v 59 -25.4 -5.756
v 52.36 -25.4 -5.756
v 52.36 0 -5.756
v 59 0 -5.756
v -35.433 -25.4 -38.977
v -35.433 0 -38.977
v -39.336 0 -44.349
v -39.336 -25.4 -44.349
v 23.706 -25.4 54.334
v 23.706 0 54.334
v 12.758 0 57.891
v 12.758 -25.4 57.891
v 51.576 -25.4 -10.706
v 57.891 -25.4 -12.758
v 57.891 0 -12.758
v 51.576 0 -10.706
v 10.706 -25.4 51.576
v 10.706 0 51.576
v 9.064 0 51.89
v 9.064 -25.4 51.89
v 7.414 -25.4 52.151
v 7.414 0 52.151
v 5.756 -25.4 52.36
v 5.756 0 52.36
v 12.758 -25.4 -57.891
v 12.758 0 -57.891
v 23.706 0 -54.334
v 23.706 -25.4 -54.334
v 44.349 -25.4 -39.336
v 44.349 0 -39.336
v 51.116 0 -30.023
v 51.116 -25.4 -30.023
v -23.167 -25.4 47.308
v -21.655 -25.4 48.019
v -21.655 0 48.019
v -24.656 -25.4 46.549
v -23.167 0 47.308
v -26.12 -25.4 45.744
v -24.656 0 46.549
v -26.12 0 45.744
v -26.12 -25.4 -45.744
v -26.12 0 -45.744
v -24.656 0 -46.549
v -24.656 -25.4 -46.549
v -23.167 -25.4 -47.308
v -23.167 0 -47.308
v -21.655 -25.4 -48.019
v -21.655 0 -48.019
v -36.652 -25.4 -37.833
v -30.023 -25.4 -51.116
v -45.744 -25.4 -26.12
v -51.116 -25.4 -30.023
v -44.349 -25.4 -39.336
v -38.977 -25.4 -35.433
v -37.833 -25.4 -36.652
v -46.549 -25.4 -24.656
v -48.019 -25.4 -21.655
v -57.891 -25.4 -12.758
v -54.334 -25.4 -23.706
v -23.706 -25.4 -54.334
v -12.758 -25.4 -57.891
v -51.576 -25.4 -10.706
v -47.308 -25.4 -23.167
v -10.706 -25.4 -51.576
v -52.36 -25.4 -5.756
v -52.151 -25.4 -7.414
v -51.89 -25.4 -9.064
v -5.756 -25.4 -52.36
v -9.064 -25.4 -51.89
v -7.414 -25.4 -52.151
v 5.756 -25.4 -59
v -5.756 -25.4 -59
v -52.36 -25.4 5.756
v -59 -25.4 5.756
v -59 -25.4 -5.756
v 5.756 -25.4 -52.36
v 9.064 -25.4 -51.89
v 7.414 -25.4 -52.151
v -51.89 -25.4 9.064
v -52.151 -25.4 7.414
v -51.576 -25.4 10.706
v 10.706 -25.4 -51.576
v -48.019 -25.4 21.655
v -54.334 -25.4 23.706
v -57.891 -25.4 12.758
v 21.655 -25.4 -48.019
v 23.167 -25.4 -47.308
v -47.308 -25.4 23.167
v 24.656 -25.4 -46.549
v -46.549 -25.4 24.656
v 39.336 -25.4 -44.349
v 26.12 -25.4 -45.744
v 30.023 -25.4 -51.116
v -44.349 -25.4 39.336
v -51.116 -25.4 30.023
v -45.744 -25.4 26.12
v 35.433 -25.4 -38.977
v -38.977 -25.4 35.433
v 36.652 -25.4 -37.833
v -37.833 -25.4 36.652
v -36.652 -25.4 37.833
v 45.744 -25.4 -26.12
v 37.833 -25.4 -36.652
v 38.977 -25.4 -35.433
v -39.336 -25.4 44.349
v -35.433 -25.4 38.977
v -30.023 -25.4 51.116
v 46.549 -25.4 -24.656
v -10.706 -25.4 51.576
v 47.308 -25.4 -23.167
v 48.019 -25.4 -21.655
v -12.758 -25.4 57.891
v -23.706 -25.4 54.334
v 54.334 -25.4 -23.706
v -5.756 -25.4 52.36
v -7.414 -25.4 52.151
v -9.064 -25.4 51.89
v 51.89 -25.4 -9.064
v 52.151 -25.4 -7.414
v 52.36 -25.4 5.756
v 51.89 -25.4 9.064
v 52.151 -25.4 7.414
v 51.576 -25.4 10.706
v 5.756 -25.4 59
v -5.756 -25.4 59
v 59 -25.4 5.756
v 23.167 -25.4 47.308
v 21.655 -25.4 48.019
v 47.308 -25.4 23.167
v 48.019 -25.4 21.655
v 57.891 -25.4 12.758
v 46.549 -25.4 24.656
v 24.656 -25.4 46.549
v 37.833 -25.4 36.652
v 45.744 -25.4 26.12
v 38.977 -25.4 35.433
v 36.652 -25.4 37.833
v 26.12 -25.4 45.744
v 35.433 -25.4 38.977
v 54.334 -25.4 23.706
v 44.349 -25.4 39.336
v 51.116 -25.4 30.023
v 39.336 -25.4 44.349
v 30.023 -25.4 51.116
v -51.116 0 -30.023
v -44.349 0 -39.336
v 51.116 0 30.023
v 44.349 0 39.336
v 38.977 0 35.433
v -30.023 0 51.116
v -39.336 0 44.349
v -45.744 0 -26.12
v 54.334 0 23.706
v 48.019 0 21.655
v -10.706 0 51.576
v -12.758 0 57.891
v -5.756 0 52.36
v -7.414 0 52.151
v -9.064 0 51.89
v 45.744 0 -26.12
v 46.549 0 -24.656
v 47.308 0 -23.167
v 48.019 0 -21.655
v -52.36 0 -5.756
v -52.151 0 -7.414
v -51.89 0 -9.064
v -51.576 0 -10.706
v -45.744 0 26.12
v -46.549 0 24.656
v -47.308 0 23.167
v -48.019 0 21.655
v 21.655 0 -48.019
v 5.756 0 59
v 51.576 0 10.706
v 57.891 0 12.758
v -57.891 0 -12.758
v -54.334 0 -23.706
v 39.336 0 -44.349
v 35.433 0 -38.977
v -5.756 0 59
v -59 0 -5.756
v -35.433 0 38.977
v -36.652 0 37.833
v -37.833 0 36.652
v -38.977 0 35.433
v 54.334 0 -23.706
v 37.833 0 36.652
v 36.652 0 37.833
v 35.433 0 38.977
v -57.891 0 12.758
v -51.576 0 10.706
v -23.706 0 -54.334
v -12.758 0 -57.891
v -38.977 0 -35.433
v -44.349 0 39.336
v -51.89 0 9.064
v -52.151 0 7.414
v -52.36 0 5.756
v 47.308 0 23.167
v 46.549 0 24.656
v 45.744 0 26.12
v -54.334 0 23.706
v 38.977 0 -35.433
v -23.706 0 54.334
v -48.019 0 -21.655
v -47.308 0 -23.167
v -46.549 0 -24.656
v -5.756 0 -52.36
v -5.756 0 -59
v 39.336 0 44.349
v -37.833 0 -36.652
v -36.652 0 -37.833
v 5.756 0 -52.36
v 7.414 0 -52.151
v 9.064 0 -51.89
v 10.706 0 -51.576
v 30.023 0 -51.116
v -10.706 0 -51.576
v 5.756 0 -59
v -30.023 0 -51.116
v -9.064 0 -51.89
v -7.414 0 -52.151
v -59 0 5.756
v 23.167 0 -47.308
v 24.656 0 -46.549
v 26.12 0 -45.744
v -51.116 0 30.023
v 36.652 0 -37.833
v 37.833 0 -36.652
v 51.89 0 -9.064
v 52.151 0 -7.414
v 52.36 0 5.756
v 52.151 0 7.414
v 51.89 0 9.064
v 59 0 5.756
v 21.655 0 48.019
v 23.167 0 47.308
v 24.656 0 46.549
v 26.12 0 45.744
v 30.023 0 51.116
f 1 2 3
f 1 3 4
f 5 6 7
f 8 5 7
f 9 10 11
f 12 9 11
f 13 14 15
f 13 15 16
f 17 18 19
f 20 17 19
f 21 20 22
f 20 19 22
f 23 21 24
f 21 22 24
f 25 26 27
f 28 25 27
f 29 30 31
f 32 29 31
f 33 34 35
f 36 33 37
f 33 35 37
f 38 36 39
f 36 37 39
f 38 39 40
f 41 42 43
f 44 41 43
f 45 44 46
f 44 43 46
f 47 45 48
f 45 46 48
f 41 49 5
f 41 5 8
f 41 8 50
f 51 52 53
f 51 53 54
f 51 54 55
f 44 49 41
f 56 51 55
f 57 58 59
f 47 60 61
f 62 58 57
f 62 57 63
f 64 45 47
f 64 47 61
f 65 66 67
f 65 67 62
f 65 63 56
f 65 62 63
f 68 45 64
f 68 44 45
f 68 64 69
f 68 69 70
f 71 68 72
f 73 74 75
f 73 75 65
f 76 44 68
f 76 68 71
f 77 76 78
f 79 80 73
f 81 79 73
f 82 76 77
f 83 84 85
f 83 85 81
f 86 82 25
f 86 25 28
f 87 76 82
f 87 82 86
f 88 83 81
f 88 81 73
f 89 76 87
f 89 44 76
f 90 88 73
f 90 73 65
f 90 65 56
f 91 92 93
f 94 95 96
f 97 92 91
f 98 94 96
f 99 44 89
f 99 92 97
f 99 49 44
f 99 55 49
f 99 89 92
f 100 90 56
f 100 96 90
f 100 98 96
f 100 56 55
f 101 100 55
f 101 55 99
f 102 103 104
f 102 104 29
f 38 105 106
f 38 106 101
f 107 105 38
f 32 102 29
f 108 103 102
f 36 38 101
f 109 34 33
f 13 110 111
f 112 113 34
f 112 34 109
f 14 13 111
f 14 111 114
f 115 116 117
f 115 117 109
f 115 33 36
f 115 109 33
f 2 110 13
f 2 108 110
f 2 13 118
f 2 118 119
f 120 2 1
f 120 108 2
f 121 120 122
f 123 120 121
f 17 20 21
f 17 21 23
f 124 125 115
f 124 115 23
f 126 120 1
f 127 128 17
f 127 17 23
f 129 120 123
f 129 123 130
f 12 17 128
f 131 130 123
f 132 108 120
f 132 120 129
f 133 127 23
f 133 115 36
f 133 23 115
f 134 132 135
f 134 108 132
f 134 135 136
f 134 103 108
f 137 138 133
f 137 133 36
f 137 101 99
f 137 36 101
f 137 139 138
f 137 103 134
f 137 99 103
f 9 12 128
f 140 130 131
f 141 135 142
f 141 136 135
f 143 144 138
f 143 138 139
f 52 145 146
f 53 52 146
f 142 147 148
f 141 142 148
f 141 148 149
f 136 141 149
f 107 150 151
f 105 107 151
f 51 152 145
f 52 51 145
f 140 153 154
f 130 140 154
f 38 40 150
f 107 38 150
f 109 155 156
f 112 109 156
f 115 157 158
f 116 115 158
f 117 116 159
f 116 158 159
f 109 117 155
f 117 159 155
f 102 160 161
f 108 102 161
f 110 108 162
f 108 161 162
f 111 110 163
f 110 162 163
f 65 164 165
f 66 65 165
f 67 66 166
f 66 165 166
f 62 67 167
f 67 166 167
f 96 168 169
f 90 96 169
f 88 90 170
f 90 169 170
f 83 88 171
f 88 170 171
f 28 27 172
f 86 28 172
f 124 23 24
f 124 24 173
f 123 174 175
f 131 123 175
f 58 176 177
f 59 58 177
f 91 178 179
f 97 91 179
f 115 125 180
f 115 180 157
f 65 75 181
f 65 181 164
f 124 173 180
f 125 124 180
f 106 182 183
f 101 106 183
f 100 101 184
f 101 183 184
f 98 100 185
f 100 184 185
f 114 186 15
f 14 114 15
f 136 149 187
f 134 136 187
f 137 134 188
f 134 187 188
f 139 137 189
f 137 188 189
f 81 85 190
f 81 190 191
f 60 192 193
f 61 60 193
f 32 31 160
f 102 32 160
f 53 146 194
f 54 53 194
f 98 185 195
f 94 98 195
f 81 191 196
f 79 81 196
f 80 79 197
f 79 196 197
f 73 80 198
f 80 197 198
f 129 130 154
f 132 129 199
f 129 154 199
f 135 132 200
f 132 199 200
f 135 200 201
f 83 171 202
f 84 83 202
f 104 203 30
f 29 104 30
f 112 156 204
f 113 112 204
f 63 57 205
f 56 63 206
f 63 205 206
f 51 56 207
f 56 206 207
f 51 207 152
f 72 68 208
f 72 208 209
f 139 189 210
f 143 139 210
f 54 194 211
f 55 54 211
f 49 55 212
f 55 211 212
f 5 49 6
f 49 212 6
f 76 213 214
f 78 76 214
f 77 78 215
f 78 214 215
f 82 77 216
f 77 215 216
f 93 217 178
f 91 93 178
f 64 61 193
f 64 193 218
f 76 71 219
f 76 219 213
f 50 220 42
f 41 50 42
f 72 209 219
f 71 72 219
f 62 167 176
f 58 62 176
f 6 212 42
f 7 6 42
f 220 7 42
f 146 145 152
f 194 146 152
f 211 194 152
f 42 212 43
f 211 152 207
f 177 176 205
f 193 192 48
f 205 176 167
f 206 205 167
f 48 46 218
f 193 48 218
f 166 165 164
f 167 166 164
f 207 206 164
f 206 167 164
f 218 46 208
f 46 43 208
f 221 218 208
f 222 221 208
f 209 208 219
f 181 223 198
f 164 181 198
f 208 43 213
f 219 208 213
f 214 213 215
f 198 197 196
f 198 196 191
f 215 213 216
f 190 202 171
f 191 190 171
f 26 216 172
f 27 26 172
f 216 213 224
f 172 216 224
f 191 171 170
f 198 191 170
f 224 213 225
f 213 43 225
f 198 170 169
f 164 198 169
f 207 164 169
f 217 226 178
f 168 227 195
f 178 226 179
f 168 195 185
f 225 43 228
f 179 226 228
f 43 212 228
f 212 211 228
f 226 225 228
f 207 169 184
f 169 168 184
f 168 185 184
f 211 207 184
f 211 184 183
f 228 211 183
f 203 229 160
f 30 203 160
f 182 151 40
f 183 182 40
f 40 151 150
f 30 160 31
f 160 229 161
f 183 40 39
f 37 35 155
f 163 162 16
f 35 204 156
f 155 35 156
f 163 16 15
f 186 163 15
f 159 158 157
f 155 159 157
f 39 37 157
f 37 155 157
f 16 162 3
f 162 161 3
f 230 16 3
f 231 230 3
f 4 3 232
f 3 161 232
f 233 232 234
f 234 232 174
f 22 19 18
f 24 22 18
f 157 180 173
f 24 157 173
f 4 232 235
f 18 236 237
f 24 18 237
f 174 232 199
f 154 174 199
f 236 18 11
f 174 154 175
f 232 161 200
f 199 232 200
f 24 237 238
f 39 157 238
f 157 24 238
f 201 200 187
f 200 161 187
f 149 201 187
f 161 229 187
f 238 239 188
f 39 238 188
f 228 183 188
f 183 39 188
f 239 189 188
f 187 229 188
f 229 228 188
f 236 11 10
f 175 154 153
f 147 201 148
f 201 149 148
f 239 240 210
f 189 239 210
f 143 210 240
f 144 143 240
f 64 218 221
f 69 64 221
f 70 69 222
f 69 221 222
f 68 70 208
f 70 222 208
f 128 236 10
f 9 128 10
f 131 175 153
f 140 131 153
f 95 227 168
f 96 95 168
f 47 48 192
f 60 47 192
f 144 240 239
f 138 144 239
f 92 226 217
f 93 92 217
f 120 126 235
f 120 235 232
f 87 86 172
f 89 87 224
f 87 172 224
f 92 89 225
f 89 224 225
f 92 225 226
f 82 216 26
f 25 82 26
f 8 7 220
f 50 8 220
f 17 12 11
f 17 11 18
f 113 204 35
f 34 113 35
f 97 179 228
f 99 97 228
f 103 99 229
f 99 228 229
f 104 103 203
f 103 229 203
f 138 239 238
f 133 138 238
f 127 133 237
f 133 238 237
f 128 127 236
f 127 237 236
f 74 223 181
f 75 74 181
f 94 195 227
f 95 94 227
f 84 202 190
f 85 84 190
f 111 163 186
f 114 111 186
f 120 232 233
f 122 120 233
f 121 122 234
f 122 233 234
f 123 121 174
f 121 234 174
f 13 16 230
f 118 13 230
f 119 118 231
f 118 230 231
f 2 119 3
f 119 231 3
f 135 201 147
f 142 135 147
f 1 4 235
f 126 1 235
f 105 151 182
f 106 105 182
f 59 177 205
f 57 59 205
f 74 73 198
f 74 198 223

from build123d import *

# Parameters (mm, degrees)
F1_DEPTH = 25.4


with BuildPart() as f1:
    # F0 (on Front) → F1 (new body)
    with BuildSketch(Plane.XZ):
        with BuildLine():
            Line((5.7561155409, 52.3600886255), (5.7561155409, 59.0001791716))
            Line((5.7561155409, 59.0001791716), (-5.7561155409, 59.0001791716))
            Line((-5.7561155409, 59.0001791716), (-5.7561155409, 52.3600886255))
            ThreePointArc((-5.7561155409, 52.3600886255), (0, 52.6755327167), (5.7561155409, 52.3600886255))
        make_face()
        with BuildLine():
            ThreePointArc((10.7057660186, 51.5761410048), (8.2402687813, 52.027009499), (5.7561155409, 52.3600886255))
            Line((5.7561155409, 52.3600886255), (5.7561155409, 46.3508862619))
            Line((5.7561155409, 46.3508862619), (-5.7561155409, 46.3508862619))
            Line((-5.7561155409, 46.3508862619), (-5.7561155409, 52.3600886255))
            ThreePointArc((-5.7561155409, 52.3600886255), (-8.2402687813, 52.027009499), (-10.7057660186, 51.5761410048))
            Line((-10.7057660186, 51.5761410048), (-8.8488203656, 45.8610499392))
            Line((-8.8488203656, 45.8610499392), (-19.797602753, 42.3035748917))
            Line((-19.797602753, 42.3035748917), (-21.6545484059, 48.0186659574))
            ThreePointArc((-21.6545484059, 48.0186659574), (-23.9141914221, 46.9342433157), (-26.1196926087, 45.7435613504))
            ThreePointArc((-26.1196926087, 45.7435613504), (-30.9619012875, 42.6154011556), (-35.433283197, 38.9768416996))
            ThreePointArc((-35.433283197, 38.9768416996), (-37.2472263866, 37.2472263866), (-38.9768416996, 35.433283197))
            ThreePointArc((-38.9768416996, 35.433283197), (-42.6154011556, 30.9619012875), (-45.7435613504, 26.1196926087))
            ThreePointArc((-45.7435613504, 26.1196926087), (-46.9342433157, 23.9141914221), (-48.0186659574, 21.6545484059))
            ThreePointArc((-48.0186659574, 21.6545484059), (-50.0974086396, 16.2776347972), (-51.5761410048, 10.7057660186))
            ThreePointArc((-51.5761410048, 10.7057660186), (-52.027009499, 8.2402687813), (-52.3600886255, 5.7561155409))
            ThreePointArc((-52.3600886255, 5.7561155409), (-52.6755327167, 0), (-52.3600886255, -5.7561155409))
            ThreePointArc((-52.3600886255, -5.7561155409), (-52.027009499, -8.2402687813), (-51.5761410048, -10.7057660186))
            ThreePointArc((-51.5761410048, -10.7057660186), (-50.0974086396, -16.2776347972), (-48.0186659574, -21.6545484059))
            ThreePointArc((-48.0186659574, -21.6545484059), (-46.9342433157, -23.9141914221), (-45.7435613504, -26.1196926087))
            Line((-45.7435613504, -26.1196926087), (-40.8820145156, -22.5875720813))
            Line((-40.8820145156, -22.5875720813), (-34.1152948648, -31.9011626696))
            Line((-34.1152948648, -31.9011626696), (-38.9768416996, -35.433283197))
            ThreePointArc((-38.9768416996, -35.433283197), (-37.2472263866, -37.2472263866), (-35.433283197, -38.9768416996))
            Line((-35.433283197, -38.9768416996), (-31.9011626696, -34.1152948648))
            Line((-31.9011626696, -34.1152948648), (-22.5875720813, -40.8820145156))
            Line((-22.5875720813, -40.8820145156), (-26.1196926087, -45.7435613504))
            ThreePointArc((-26.1196926087, -45.7435613504), (-23.9141914221, -46.9342433157), (-21.6545484059, -48.0186659574))
            Line((-21.6545484059, -48.0186659574), (-19.797602753, -42.3035748917))
            Line((-19.797602753, -42.3035748917), (-8.8488203656, -45.8610499392))
            Line((-8.8488203656, -45.8610499392), (-10.7057660186, -51.5761410048))
            ThreePointArc((-10.7057660186, -51.5761410048), (-8.2402687813, -52.027009499), (-5.7561155409, -52.3600886255))
            Line((-5.7561155409, -52.3600886255), (-5.7561155409, -46.3508862619))
            Line((-5.7561155409, -46.3508862619), (5.7561155409, -46.3508862619))
            Line((5.7561155409, -46.3508862619), (5.7561155409, -52.3600886255))
            ThreePointArc((5.7561155409, -52.3600886255), (8.2402687813, -52.027009499), (10.7057660186, -51.5761410048))
            Line((10.7057660186, -51.5761410048), (8.8488203656, -45.8610499392))
            Line((8.8488203656, -45.8610499392), (19.797602753, -42.3035748917))
            Line((19.797602753, -42.3035748917), (21.6545484059, -48.0186659574))
            ThreePointArc((21.6545484059, -48.0186659574), (23.9141914221, -46.9342433157), (26.1196926087, -45.7435613504))
            Line((26.1196926087, -45.7435613504), (22.5875720813, -40.8820145156))
            Line((22.5875720813, -40.8820145156), (31.9011626696, -34.1152948648))
            Line((31.9011626696, -34.1152948648), (35.433283197, -38.9768416996))
            ThreePointArc((35.433283197, -38.9768416996), (37.2472263866, -37.2472263866), (38.9768416996, -35.433283197))
            Line((38.9768416996, -35.433283197), (34.1152948648, -31.9011626696))
            Line((34.1152948648, -31.9011626696), (40.8820145156, -22.5875720813))
            Line((40.8820145156, -22.5875720813), (45.7435613504, -26.1196926087))
            ThreePointArc((45.7435613504, -26.1196926087), (46.9342433157, -23.9141914221), (48.0186659574, -21.6545484059))
            Line((48.0186659574, -21.6545484059), (42.3035748917, -19.797602753))
            Line((42.3035748917, -19.797602753), (45.8610499392, -8.8488203656))
            Line((45.8610499392, -8.8488203656), (51.5761410048, -10.7057660186))
            ThreePointArc((51.5761410048, -10.7057660186), (52.027009499, -8.2402687813), (52.3600886255, -5.7561155409))
            Line((52.3600886255, -5.7561155409), (46.3508862619, -5.7561155409))
            Line((46.3508862619, -5.7561155409), (46.3508862619, 5.7561155409))
            Line((46.3508862619, 5.7561155409), (52.3600886255, 5.7561155409))
            ThreePointArc((52.3600886255, 5.7561155409), (52.027009499, 8.2402687813), (51.5761410048, 10.7057660186))
            Line((51.5761410048, 10.7057660186), (45.8610499392, 8.8488203656))
            Line((45.8610499392, 8.8488203656), (42.3035748917, 19.797602753))
            Line((42.3035748917, 19.797602753), (48.0186659574, 21.6545484059))
            ThreePointArc((48.0186659574, 21.6545484059), (46.9342433157, 23.9141914221), (45.7435613504, 26.1196926087))
            Line((45.7435613504, 26.1196926087), (40.8820145156, 22.5875720813))
            Line((40.8820145156, 22.5875720813), (34.1152948648, 31.9011626696))
            Line((34.1152948648, 31.9011626696), (38.9768416996, 35.433283197))
            ThreePointArc((38.9768416996, 35.433283197), (37.2472263866, 37.2472263866), (35.433283197, 38.9768416996))
            Line((35.433283197, 38.9768416996), (31.9011626696, 34.1152948648))
            Line((31.9011626696, 34.1152948648), (22.5875720813, 40.8820145156))
            Line((22.5875720813, 40.8820145156), (26.1196926087, 45.7435613504))
            ThreePointArc((26.1196926087, 45.7435613504), (23.9141914221, 46.9342433157), (21.6545484059, 48.0186659574))
            Line((21.6545484059, 48.0186659574), (19.797602753, 42.3035748917))
            Line((19.797602753, 42.3035748917), (8.8488203656, 45.8610499392))
            Line((8.8488203656, 45.8610499392), (10.7057660186, 51.5761410048))
        make_face()
        with BuildLine():
            Line((5.7561155409, 46.3508862619), (5.7561155409, 52.3600886255))
            ThreePointArc((5.7561155409, 52.3600886255), (0, 52.6755327167), (-5.7561155409, 52.3600886255))
            Line((-5.7561155409, 52.3600886255), (-5.7561155409, 46.3508862619))
            Line((-5.7561155409, 46.3508862619), (5.7561155409, 46.3508862619))
        make_face()
        with BuildLine():
            ThreePointArc((21.6545484059, 48.0186659574), (16.2776347972, 50.0974086396), (10.7057660186, 51.5761410048))
            Line((10.7057660186, 51.5761410048), (8.8488203656, 45.8610499392))
            Line((8.8488203656, 45.8610499392), (19.797602753, 42.3035748917))
            Line((19.797602753, 42.3035748917), (21.6545484059, 48.0186659574))
        make_face()
        with BuildLine():
            Line((12.7576668415, 57.8912423874), (10.7057660186, 51.5761410048))
            ThreePointArc((10.7057660186, 51.5761410048), (16.2776347972, 50.0974086396), (21.6545484059, 48.0186659574))
            Line((21.6545484059, 48.0186659574), (23.7064492289, 54.33376734))
            Line((23.7064492289, 54.33376734), (12.7576668415, 57.8912423874))
        make_face()
        with BuildLine():
            ThreePointArc((-21.6545484059, 48.0186659574), (-16.2776347972, 50.0974086396), (-10.7057660186, 51.5761410048))
            Line((-10.7057660186, 51.5761410048), (-12.7576668415, 57.8912423874))
            Line((-12.7576668415, 57.8912423874), (-23.7064492289, 54.33376734))
            Line((-23.7064492289, 54.33376734), (-21.6545484059, 48.0186659574))
        make_face()
        with BuildLine():
            Line((-8.8488203656, 45.8610499392), (-10.7057660186, 51.5761410048))
            ThreePointArc((-10.7057660186, 51.5761410048), (-16.2776347972, 50.0974086396), (-21.6545484059, 48.0186659574))
            Line((-21.6545484059, 48.0186659574), (-19.797602753, 42.3035748917))
            Line((-19.797602753, 42.3035748917), (-8.8488203656, 45.8610499392))
        make_face()
        with BuildLine():
            ThreePointArc((35.433283197, 38.9768416996), (30.9619012875, 42.6154011556), (26.1196926087, 45.7435613504))
            Line((26.1196926087, 45.7435613504), (22.5875720813, 40.8820145156))
            Line((22.5875720813, 40.8820145156), (31.9011626696, 34.1152948648))
            Line((31.9011626696, 34.1152948648), (35.433283197, 38.9768416996))
        make_face()
        with BuildLine():
            Line((30.0226399055, 51.1155074464), (26.1196926087, 45.7435613504))
            ThreePointArc((26.1196926087, 45.7435613504), (30.9619012875, 42.6154011556), (35.433283197, 38.9768416996))
            Line((35.433283197, 38.9768416996), (39.3362304938, 44.3487877956))
            Line((39.3362304938, 44.3487877956), (30.0226399055, 51.1155074464))
        make_face()
        with BuildLine():
            ThreePointArc((-35.433283197, 38.9768416996), (-30.9619012875, 42.6154011556), (-26.1196926087, 45.7435613504))
            Line((-26.1196926087, 45.7435613504), (-30.0226399055, 51.1155074464))
            Line((-30.0226399055, 51.1155074464), (-39.3362304938, 44.3487877956))
            Line((-39.3362304938, 44.3487877956), (-35.433283197, 38.9768416996))
        make_face()
        with BuildLine():
            ThreePointArc((45.7435613504, 26.1196926087), (42.6154011556, 30.9619012875), (38.9768416996, 35.433283197))
            Line((38.9768416996, 35.433283197), (34.1152948648, 31.9011626696))
            Line((34.1152948648, 31.9011626696), (40.8820145156, 22.5875720813))
            Line((40.8820145156, 22.5875720813), (45.7435613504, 26.1196926087))
        make_face()
        with BuildLine():
            Line((44.3487877956, 39.3362304938), (38.9768416996, 35.433283197))
            ThreePointArc((38.9768416996, 35.433283197), (42.6154011556, 30.9619012875), (45.7435613504, 26.1196926087))
            Line((45.7435613504, 26.1196926087), (51.1155074464, 30.0226399055))
            Line((51.1155074464, 30.0226399055), (44.3487877956, 39.3362304938))
        make_face()
        with BuildLine():
            ThreePointArc((-45.7435613504, 26.1196926087), (-42.6154011556, 30.9619012875), (-38.9768416996, 35.433283197))
            Line((-38.9768416996, 35.433283197), (-44.3487877956, 39.3362304938))
            Line((-44.3487877956, 39.3362304938), (-51.1155074464, 30.0226399055))
            Line((-51.1155074464, 30.0226399055), (-45.7435613504, 26.1196926087))
        make_face()
        with BuildLine():
            ThreePointArc((51.5761410048, 10.7057660186), (50.0974086396, 16.2776347972), (48.0186659574, 21.6545484059))
            Line((48.0186659574, 21.6545484059), (42.3035748917, 19.797602753))
            Line((42.3035748917, 19.797602753), (45.8610499392, 8.8488203656))
            Line((45.8610499392, 8.8488203656), (51.5761410048, 10.7057660186))
        make_face()
        with BuildLine():
            Line((54.33376734, 23.7064492289), (48.0186659574, 21.6545484059))
            ThreePointArc((48.0186659574, 21.6545484059), (50.0974086396, 16.2776347972), (51.5761410048, 10.7057660186))
            Line((51.5761410048, 10.7057660186), (57.8912423874, 12.7576668415))
            Line((57.8912423874, 12.7576668415), (54.33376734, 23.7064492289))
        make_face()
        with BuildLine():
            ThreePointArc((-51.5761410048, 10.7057660186), (-50.0974086396, 16.2776347972), (-48.0186659574, 21.6545484059))
            Line((-48.0186659574, 21.6545484059), (-54.33376734, 23.7064492289))
            Line((-54.33376734, 23.7064492289), (-57.8912423874, 12.7576668415))
            Line((-57.8912423874, 12.7576668415), (-51.5761410048, 10.7057660186))
        make_face()
        with BuildLine():
            ThreePointArc((52.6755327167, 0), (52.5966125736, 2.8823762373), (52.3600886255, 5.7561155409))
            Line((52.3600886255, 5.7561155409), (46.3508862619, 5.7561155409))
            Line((46.3508862619, 5.7561155409), (46.3508862619, -5.7561155409))
            Line((46.3508862619, -5.7561155409), (52.3600886255, -5.7561155409))
            ThreePointArc((52.3600886255, -5.7561155409), (52.5966125736, -2.8823762373), (52.6755327167, 0))
        make_face()
        with BuildLine():
            Line((59.0001791716, 5.7561155409), (52.3600886255, 5.7561155409))
            ThreePointArc((52.3600886255, 5.7561155409), (52.5966125736, 2.8823762373), (52.6755327167, 0))
            ThreePointArc((52.6755327167, 0), (52.5966125736, -2.8823762373), (52.3600886255, -5.7561155409))
            Line((52.3600886255, -5.7561155409), (59.0001791716, -5.7561155409))
            Line((59.0001791716, -5.7561155409), (59.0001791716, 5.7561155409))
        make_face()
        with BuildLine():
            ThreePointArc((-52.3600886255, -5.7561155409), (-52.6755327167, 0), (-52.3600886255, 5.7561155409))
            Line((-52.3600886255, 5.7561155409), (-59.0001791716, 5.7561155409))
            Line((-59.0001791716, 5.7561155409), (-59.0001791716, -5.7561155409))
            Line((-59.0001791716, -5.7561155409), (-52.3600886255, -5.7561155409))
        make_face()
        with BuildLine():
            ThreePointArc((-48.0186659574, -21.6545484059), (-50.0974086396, -16.2776347972), (-51.5761410048, -10.7057660186))
            Line((-51.5761410048, -10.7057660186), (-57.8912423874, -12.7576668415))
            Line((-57.8912423874, -12.7576668415), (-54.33376734, -23.7064492289))
            Line((-54.33376734, -23.7064492289), (-48.0186659574, -21.6545484059))
        make_face()
        with BuildLine():
            ThreePointArc((48.0186659574, -21.6545484059), (50.0974086396, -16.2776347972), (51.5761410048, -10.7057660186))
            Line((51.5761410048, -10.7057660186), (45.8610499392, -8.8488203656))
            Line((45.8610499392, -8.8488203656), (42.3035748917, -19.797602753))
            Line((42.3035748917, -19.797602753), (48.0186659574, -21.6545484059))
        make_face()
        with BuildLine():
            Line((57.8912423874, -12.7576668415), (51.5761410048, -10.7057660186))
            ThreePointArc((51.5761410048, -10.7057660186), (50.0974086396, -16.2776347972), (48.0186659574, -21.6545484059))
            Line((48.0186659574, -21.6545484059), (54.33376734, -23.7064492289))
            Line((54.33376734, -23.7064492289), (57.8912423874, -12.7576668415))
        make_face()
        with BuildLine():
            ThreePointArc((-38.9768416996, -35.433283197), (-42.6154011556, -30.9619012875), (-45.7435613504, -26.1196926087))
            Line((-45.7435613504, -26.1196926087), (-51.1155074464, -30.0226399055))
            Line((-51.1155074464, -30.0226399055), (-44.3487877956, -39.3362304938))
            Line((-44.3487877956, -39.3362304938), (-38.9768416996, -35.433283197))
        make_face()
        with BuildLine():
            Line((-40.8820145156, -22.5875720813), (-45.7435613504, -26.1196926087))
            ThreePointArc((-45.7435613504, -26.1196926087), (-42.6154011556, -30.9619012875), (-38.9768416996, -35.433283197))
            Line((-38.9768416996, -35.433283197), (-34.1152948648, -31.9011626696))
            Line((-34.1152948648, -31.9011626696), (-40.8820145156, -22.5875720813))
        make_face()
        with BuildLine():
            ThreePointArc((38.9768416996, -35.433283197), (42.6154011556, -30.9619012875), (45.7435613504, -26.1196926087))
            Line((45.7435613504, -26.1196926087), (40.8820145156, -22.5875720813))
            Line((40.8820145156, -22.5875720813), (34.1152948648, -31.9011626696))
            Line((34.1152948648, -31.9011626696), (38.9768416996, -35.433283197))
        make_face()
        with BuildLine():
            Line((51.1155074464, -30.0226399055), (45.7435613504, -26.1196926087))
            ThreePointArc((45.7435613504, -26.1196926087), (42.6154011556, -30.9619012875), (38.9768416996, -35.433283197))
            Line((38.9768416996, -35.433283197), (44.3487877956, -39.3362304938))
            Line((44.3487877956, -39.3362304938), (51.1155074464, -30.0226399055))
        make_face()
        with BuildLine():
            ThreePointArc((-26.1196926087, -45.7435613504), (-30.9619012875, -42.6154011556), (-35.433283197, -38.9768416996))
            Line((-35.433283197, -38.9768416996), (-39.3362304938, -44.3487877956))
            Line((-39.3362304938, -44.3487877956), (-30.0226399055, -51.1155074464))
            Line((-30.0226399055, -51.1155074464), (-26.1196926087, -45.7435613504))
        make_face()
        with BuildLine():
            Line((-31.9011626696, -34.1152948648), (-35.433283197, -38.9768416996))
            ThreePointArc((-35.433283197, -38.9768416996), (-30.9619012875, -42.6154011556), (-26.1196926087, -45.7435613504))
            Line((-26.1196926087, -45.7435613504), (-22.5875720813, -40.8820145156))
            Line((-22.5875720813, -40.8820145156), (-31.9011626696, -34.1152948648))
        make_face()
        with BuildLine():
            ThreePointArc((26.1196926087, -45.7435613504), (30.9619012875, -42.6154011556), (35.433283197, -38.9768416996))
            Line((35.433283197, -38.9768416996), (31.9011626696, -34.1152948648))
            Line((31.9011626696, -34.1152948648), (22.5875720813, -40.8820145156))
            Line((22.5875720813, -40.8820145156), (26.1196926087, -45.7435613504))
        make_face()
        with BuildLine():
            Line((39.3362304938, -44.3487877956), (35.433283197, -38.9768416996))
            ThreePointArc((35.433283197, -38.9768416996), (30.9619012875, -42.6154011556), (26.1196926087, -45.7435613504))
            Line((26.1196926087, -45.7435613504), (30.0226399055, -51.1155074464))
            Line((30.0226399055, -51.1155074464), (39.3362304938, -44.3487877956))
        make_face()
        with BuildLine():
            ThreePointArc((-10.7057660186, -51.5761410048), (-16.2776347972, -50.0974086396), (-21.6545484059, -48.0186659574))
            Line((-21.6545484059, -48.0186659574), (-23.7064492289, -54.33376734))
            Line((-23.7064492289, -54.33376734), (-12.7576668415, -57.8912423874))
            Line((-12.7576668415, -57.8912423874), (-10.7057660186, -51.5761410048))
        make_face()
        with BuildLine():
            Line((-19.797602753, -42.3035748917), (-21.6545484059, -48.0186659574))
            ThreePointArc((-21.6545484059, -48.0186659574), (-16.2776347972, -50.0974086396), (-10.7057660186, -51.5761410048))
            Line((-10.7057660186, -51.5761410048), (-8.8488203656, -45.8610499392))
            Line((-8.8488203656, -45.8610499392), (-19.797602753, -42.3035748917))
        make_face()
        with BuildLine():
            ThreePointArc((10.7057660186, -51.5761410048), (16.2776347972, -50.0974086396), (21.6545484059, -48.0186659574))
            Line((21.6545484059, -48.0186659574), (19.797602753, -42.3035748917))
            Line((19.797602753, -42.3035748917), (8.8488203656, -45.8610499392))
            Line((8.8488203656, -45.8610499392), (10.7057660186, -51.5761410048))
        make_face()
        with BuildLine():
            Line((23.7064492289, -54.33376734), (21.6545484059, -48.0186659574))
            ThreePointArc((21.6545484059, -48.0186659574), (16.2776347972, -50.0974086396), (10.7057660186, -51.5761410048))
            Line((10.7057660186, -51.5761410048), (12.7576668415, -57.8912423874))
            Line((12.7576668415, -57.8912423874), (23.7064492289, -54.33376734))
        make_face()
        with BuildLine():
            ThreePointArc((5.7561155409, -52.3600886255), (0, -52.6755327167), (-5.7561155409, -52.3600886255))
            Line((-5.7561155409, -52.3600886255), (-5.7561155409, -59.0001791716))
            Line((-5.7561155409, -59.0001791716), (5.7561155409, -59.0001791716))
            Line((5.7561155409, -59.0001791716), (5.7561155409, -52.3600886255))
        make_face()
        with BuildLine():
            Line((-5.7561155409, -46.3508862619), (-5.7561155409, -52.3600886255))
            ThreePointArc((-5.7561155409, -52.3600886255), (0, -52.6755327167), (5.7561155409, -52.3600886255))
            Line((5.7561155409, -52.3600886255), (5.7561155409, -46.3508862619))
            Line((5.7561155409, -46.3508862619), (-5.7561155409, -46.3508862619))
        make_face()
    extrude(amount=F1_DEPTH)


solid = f1.part
